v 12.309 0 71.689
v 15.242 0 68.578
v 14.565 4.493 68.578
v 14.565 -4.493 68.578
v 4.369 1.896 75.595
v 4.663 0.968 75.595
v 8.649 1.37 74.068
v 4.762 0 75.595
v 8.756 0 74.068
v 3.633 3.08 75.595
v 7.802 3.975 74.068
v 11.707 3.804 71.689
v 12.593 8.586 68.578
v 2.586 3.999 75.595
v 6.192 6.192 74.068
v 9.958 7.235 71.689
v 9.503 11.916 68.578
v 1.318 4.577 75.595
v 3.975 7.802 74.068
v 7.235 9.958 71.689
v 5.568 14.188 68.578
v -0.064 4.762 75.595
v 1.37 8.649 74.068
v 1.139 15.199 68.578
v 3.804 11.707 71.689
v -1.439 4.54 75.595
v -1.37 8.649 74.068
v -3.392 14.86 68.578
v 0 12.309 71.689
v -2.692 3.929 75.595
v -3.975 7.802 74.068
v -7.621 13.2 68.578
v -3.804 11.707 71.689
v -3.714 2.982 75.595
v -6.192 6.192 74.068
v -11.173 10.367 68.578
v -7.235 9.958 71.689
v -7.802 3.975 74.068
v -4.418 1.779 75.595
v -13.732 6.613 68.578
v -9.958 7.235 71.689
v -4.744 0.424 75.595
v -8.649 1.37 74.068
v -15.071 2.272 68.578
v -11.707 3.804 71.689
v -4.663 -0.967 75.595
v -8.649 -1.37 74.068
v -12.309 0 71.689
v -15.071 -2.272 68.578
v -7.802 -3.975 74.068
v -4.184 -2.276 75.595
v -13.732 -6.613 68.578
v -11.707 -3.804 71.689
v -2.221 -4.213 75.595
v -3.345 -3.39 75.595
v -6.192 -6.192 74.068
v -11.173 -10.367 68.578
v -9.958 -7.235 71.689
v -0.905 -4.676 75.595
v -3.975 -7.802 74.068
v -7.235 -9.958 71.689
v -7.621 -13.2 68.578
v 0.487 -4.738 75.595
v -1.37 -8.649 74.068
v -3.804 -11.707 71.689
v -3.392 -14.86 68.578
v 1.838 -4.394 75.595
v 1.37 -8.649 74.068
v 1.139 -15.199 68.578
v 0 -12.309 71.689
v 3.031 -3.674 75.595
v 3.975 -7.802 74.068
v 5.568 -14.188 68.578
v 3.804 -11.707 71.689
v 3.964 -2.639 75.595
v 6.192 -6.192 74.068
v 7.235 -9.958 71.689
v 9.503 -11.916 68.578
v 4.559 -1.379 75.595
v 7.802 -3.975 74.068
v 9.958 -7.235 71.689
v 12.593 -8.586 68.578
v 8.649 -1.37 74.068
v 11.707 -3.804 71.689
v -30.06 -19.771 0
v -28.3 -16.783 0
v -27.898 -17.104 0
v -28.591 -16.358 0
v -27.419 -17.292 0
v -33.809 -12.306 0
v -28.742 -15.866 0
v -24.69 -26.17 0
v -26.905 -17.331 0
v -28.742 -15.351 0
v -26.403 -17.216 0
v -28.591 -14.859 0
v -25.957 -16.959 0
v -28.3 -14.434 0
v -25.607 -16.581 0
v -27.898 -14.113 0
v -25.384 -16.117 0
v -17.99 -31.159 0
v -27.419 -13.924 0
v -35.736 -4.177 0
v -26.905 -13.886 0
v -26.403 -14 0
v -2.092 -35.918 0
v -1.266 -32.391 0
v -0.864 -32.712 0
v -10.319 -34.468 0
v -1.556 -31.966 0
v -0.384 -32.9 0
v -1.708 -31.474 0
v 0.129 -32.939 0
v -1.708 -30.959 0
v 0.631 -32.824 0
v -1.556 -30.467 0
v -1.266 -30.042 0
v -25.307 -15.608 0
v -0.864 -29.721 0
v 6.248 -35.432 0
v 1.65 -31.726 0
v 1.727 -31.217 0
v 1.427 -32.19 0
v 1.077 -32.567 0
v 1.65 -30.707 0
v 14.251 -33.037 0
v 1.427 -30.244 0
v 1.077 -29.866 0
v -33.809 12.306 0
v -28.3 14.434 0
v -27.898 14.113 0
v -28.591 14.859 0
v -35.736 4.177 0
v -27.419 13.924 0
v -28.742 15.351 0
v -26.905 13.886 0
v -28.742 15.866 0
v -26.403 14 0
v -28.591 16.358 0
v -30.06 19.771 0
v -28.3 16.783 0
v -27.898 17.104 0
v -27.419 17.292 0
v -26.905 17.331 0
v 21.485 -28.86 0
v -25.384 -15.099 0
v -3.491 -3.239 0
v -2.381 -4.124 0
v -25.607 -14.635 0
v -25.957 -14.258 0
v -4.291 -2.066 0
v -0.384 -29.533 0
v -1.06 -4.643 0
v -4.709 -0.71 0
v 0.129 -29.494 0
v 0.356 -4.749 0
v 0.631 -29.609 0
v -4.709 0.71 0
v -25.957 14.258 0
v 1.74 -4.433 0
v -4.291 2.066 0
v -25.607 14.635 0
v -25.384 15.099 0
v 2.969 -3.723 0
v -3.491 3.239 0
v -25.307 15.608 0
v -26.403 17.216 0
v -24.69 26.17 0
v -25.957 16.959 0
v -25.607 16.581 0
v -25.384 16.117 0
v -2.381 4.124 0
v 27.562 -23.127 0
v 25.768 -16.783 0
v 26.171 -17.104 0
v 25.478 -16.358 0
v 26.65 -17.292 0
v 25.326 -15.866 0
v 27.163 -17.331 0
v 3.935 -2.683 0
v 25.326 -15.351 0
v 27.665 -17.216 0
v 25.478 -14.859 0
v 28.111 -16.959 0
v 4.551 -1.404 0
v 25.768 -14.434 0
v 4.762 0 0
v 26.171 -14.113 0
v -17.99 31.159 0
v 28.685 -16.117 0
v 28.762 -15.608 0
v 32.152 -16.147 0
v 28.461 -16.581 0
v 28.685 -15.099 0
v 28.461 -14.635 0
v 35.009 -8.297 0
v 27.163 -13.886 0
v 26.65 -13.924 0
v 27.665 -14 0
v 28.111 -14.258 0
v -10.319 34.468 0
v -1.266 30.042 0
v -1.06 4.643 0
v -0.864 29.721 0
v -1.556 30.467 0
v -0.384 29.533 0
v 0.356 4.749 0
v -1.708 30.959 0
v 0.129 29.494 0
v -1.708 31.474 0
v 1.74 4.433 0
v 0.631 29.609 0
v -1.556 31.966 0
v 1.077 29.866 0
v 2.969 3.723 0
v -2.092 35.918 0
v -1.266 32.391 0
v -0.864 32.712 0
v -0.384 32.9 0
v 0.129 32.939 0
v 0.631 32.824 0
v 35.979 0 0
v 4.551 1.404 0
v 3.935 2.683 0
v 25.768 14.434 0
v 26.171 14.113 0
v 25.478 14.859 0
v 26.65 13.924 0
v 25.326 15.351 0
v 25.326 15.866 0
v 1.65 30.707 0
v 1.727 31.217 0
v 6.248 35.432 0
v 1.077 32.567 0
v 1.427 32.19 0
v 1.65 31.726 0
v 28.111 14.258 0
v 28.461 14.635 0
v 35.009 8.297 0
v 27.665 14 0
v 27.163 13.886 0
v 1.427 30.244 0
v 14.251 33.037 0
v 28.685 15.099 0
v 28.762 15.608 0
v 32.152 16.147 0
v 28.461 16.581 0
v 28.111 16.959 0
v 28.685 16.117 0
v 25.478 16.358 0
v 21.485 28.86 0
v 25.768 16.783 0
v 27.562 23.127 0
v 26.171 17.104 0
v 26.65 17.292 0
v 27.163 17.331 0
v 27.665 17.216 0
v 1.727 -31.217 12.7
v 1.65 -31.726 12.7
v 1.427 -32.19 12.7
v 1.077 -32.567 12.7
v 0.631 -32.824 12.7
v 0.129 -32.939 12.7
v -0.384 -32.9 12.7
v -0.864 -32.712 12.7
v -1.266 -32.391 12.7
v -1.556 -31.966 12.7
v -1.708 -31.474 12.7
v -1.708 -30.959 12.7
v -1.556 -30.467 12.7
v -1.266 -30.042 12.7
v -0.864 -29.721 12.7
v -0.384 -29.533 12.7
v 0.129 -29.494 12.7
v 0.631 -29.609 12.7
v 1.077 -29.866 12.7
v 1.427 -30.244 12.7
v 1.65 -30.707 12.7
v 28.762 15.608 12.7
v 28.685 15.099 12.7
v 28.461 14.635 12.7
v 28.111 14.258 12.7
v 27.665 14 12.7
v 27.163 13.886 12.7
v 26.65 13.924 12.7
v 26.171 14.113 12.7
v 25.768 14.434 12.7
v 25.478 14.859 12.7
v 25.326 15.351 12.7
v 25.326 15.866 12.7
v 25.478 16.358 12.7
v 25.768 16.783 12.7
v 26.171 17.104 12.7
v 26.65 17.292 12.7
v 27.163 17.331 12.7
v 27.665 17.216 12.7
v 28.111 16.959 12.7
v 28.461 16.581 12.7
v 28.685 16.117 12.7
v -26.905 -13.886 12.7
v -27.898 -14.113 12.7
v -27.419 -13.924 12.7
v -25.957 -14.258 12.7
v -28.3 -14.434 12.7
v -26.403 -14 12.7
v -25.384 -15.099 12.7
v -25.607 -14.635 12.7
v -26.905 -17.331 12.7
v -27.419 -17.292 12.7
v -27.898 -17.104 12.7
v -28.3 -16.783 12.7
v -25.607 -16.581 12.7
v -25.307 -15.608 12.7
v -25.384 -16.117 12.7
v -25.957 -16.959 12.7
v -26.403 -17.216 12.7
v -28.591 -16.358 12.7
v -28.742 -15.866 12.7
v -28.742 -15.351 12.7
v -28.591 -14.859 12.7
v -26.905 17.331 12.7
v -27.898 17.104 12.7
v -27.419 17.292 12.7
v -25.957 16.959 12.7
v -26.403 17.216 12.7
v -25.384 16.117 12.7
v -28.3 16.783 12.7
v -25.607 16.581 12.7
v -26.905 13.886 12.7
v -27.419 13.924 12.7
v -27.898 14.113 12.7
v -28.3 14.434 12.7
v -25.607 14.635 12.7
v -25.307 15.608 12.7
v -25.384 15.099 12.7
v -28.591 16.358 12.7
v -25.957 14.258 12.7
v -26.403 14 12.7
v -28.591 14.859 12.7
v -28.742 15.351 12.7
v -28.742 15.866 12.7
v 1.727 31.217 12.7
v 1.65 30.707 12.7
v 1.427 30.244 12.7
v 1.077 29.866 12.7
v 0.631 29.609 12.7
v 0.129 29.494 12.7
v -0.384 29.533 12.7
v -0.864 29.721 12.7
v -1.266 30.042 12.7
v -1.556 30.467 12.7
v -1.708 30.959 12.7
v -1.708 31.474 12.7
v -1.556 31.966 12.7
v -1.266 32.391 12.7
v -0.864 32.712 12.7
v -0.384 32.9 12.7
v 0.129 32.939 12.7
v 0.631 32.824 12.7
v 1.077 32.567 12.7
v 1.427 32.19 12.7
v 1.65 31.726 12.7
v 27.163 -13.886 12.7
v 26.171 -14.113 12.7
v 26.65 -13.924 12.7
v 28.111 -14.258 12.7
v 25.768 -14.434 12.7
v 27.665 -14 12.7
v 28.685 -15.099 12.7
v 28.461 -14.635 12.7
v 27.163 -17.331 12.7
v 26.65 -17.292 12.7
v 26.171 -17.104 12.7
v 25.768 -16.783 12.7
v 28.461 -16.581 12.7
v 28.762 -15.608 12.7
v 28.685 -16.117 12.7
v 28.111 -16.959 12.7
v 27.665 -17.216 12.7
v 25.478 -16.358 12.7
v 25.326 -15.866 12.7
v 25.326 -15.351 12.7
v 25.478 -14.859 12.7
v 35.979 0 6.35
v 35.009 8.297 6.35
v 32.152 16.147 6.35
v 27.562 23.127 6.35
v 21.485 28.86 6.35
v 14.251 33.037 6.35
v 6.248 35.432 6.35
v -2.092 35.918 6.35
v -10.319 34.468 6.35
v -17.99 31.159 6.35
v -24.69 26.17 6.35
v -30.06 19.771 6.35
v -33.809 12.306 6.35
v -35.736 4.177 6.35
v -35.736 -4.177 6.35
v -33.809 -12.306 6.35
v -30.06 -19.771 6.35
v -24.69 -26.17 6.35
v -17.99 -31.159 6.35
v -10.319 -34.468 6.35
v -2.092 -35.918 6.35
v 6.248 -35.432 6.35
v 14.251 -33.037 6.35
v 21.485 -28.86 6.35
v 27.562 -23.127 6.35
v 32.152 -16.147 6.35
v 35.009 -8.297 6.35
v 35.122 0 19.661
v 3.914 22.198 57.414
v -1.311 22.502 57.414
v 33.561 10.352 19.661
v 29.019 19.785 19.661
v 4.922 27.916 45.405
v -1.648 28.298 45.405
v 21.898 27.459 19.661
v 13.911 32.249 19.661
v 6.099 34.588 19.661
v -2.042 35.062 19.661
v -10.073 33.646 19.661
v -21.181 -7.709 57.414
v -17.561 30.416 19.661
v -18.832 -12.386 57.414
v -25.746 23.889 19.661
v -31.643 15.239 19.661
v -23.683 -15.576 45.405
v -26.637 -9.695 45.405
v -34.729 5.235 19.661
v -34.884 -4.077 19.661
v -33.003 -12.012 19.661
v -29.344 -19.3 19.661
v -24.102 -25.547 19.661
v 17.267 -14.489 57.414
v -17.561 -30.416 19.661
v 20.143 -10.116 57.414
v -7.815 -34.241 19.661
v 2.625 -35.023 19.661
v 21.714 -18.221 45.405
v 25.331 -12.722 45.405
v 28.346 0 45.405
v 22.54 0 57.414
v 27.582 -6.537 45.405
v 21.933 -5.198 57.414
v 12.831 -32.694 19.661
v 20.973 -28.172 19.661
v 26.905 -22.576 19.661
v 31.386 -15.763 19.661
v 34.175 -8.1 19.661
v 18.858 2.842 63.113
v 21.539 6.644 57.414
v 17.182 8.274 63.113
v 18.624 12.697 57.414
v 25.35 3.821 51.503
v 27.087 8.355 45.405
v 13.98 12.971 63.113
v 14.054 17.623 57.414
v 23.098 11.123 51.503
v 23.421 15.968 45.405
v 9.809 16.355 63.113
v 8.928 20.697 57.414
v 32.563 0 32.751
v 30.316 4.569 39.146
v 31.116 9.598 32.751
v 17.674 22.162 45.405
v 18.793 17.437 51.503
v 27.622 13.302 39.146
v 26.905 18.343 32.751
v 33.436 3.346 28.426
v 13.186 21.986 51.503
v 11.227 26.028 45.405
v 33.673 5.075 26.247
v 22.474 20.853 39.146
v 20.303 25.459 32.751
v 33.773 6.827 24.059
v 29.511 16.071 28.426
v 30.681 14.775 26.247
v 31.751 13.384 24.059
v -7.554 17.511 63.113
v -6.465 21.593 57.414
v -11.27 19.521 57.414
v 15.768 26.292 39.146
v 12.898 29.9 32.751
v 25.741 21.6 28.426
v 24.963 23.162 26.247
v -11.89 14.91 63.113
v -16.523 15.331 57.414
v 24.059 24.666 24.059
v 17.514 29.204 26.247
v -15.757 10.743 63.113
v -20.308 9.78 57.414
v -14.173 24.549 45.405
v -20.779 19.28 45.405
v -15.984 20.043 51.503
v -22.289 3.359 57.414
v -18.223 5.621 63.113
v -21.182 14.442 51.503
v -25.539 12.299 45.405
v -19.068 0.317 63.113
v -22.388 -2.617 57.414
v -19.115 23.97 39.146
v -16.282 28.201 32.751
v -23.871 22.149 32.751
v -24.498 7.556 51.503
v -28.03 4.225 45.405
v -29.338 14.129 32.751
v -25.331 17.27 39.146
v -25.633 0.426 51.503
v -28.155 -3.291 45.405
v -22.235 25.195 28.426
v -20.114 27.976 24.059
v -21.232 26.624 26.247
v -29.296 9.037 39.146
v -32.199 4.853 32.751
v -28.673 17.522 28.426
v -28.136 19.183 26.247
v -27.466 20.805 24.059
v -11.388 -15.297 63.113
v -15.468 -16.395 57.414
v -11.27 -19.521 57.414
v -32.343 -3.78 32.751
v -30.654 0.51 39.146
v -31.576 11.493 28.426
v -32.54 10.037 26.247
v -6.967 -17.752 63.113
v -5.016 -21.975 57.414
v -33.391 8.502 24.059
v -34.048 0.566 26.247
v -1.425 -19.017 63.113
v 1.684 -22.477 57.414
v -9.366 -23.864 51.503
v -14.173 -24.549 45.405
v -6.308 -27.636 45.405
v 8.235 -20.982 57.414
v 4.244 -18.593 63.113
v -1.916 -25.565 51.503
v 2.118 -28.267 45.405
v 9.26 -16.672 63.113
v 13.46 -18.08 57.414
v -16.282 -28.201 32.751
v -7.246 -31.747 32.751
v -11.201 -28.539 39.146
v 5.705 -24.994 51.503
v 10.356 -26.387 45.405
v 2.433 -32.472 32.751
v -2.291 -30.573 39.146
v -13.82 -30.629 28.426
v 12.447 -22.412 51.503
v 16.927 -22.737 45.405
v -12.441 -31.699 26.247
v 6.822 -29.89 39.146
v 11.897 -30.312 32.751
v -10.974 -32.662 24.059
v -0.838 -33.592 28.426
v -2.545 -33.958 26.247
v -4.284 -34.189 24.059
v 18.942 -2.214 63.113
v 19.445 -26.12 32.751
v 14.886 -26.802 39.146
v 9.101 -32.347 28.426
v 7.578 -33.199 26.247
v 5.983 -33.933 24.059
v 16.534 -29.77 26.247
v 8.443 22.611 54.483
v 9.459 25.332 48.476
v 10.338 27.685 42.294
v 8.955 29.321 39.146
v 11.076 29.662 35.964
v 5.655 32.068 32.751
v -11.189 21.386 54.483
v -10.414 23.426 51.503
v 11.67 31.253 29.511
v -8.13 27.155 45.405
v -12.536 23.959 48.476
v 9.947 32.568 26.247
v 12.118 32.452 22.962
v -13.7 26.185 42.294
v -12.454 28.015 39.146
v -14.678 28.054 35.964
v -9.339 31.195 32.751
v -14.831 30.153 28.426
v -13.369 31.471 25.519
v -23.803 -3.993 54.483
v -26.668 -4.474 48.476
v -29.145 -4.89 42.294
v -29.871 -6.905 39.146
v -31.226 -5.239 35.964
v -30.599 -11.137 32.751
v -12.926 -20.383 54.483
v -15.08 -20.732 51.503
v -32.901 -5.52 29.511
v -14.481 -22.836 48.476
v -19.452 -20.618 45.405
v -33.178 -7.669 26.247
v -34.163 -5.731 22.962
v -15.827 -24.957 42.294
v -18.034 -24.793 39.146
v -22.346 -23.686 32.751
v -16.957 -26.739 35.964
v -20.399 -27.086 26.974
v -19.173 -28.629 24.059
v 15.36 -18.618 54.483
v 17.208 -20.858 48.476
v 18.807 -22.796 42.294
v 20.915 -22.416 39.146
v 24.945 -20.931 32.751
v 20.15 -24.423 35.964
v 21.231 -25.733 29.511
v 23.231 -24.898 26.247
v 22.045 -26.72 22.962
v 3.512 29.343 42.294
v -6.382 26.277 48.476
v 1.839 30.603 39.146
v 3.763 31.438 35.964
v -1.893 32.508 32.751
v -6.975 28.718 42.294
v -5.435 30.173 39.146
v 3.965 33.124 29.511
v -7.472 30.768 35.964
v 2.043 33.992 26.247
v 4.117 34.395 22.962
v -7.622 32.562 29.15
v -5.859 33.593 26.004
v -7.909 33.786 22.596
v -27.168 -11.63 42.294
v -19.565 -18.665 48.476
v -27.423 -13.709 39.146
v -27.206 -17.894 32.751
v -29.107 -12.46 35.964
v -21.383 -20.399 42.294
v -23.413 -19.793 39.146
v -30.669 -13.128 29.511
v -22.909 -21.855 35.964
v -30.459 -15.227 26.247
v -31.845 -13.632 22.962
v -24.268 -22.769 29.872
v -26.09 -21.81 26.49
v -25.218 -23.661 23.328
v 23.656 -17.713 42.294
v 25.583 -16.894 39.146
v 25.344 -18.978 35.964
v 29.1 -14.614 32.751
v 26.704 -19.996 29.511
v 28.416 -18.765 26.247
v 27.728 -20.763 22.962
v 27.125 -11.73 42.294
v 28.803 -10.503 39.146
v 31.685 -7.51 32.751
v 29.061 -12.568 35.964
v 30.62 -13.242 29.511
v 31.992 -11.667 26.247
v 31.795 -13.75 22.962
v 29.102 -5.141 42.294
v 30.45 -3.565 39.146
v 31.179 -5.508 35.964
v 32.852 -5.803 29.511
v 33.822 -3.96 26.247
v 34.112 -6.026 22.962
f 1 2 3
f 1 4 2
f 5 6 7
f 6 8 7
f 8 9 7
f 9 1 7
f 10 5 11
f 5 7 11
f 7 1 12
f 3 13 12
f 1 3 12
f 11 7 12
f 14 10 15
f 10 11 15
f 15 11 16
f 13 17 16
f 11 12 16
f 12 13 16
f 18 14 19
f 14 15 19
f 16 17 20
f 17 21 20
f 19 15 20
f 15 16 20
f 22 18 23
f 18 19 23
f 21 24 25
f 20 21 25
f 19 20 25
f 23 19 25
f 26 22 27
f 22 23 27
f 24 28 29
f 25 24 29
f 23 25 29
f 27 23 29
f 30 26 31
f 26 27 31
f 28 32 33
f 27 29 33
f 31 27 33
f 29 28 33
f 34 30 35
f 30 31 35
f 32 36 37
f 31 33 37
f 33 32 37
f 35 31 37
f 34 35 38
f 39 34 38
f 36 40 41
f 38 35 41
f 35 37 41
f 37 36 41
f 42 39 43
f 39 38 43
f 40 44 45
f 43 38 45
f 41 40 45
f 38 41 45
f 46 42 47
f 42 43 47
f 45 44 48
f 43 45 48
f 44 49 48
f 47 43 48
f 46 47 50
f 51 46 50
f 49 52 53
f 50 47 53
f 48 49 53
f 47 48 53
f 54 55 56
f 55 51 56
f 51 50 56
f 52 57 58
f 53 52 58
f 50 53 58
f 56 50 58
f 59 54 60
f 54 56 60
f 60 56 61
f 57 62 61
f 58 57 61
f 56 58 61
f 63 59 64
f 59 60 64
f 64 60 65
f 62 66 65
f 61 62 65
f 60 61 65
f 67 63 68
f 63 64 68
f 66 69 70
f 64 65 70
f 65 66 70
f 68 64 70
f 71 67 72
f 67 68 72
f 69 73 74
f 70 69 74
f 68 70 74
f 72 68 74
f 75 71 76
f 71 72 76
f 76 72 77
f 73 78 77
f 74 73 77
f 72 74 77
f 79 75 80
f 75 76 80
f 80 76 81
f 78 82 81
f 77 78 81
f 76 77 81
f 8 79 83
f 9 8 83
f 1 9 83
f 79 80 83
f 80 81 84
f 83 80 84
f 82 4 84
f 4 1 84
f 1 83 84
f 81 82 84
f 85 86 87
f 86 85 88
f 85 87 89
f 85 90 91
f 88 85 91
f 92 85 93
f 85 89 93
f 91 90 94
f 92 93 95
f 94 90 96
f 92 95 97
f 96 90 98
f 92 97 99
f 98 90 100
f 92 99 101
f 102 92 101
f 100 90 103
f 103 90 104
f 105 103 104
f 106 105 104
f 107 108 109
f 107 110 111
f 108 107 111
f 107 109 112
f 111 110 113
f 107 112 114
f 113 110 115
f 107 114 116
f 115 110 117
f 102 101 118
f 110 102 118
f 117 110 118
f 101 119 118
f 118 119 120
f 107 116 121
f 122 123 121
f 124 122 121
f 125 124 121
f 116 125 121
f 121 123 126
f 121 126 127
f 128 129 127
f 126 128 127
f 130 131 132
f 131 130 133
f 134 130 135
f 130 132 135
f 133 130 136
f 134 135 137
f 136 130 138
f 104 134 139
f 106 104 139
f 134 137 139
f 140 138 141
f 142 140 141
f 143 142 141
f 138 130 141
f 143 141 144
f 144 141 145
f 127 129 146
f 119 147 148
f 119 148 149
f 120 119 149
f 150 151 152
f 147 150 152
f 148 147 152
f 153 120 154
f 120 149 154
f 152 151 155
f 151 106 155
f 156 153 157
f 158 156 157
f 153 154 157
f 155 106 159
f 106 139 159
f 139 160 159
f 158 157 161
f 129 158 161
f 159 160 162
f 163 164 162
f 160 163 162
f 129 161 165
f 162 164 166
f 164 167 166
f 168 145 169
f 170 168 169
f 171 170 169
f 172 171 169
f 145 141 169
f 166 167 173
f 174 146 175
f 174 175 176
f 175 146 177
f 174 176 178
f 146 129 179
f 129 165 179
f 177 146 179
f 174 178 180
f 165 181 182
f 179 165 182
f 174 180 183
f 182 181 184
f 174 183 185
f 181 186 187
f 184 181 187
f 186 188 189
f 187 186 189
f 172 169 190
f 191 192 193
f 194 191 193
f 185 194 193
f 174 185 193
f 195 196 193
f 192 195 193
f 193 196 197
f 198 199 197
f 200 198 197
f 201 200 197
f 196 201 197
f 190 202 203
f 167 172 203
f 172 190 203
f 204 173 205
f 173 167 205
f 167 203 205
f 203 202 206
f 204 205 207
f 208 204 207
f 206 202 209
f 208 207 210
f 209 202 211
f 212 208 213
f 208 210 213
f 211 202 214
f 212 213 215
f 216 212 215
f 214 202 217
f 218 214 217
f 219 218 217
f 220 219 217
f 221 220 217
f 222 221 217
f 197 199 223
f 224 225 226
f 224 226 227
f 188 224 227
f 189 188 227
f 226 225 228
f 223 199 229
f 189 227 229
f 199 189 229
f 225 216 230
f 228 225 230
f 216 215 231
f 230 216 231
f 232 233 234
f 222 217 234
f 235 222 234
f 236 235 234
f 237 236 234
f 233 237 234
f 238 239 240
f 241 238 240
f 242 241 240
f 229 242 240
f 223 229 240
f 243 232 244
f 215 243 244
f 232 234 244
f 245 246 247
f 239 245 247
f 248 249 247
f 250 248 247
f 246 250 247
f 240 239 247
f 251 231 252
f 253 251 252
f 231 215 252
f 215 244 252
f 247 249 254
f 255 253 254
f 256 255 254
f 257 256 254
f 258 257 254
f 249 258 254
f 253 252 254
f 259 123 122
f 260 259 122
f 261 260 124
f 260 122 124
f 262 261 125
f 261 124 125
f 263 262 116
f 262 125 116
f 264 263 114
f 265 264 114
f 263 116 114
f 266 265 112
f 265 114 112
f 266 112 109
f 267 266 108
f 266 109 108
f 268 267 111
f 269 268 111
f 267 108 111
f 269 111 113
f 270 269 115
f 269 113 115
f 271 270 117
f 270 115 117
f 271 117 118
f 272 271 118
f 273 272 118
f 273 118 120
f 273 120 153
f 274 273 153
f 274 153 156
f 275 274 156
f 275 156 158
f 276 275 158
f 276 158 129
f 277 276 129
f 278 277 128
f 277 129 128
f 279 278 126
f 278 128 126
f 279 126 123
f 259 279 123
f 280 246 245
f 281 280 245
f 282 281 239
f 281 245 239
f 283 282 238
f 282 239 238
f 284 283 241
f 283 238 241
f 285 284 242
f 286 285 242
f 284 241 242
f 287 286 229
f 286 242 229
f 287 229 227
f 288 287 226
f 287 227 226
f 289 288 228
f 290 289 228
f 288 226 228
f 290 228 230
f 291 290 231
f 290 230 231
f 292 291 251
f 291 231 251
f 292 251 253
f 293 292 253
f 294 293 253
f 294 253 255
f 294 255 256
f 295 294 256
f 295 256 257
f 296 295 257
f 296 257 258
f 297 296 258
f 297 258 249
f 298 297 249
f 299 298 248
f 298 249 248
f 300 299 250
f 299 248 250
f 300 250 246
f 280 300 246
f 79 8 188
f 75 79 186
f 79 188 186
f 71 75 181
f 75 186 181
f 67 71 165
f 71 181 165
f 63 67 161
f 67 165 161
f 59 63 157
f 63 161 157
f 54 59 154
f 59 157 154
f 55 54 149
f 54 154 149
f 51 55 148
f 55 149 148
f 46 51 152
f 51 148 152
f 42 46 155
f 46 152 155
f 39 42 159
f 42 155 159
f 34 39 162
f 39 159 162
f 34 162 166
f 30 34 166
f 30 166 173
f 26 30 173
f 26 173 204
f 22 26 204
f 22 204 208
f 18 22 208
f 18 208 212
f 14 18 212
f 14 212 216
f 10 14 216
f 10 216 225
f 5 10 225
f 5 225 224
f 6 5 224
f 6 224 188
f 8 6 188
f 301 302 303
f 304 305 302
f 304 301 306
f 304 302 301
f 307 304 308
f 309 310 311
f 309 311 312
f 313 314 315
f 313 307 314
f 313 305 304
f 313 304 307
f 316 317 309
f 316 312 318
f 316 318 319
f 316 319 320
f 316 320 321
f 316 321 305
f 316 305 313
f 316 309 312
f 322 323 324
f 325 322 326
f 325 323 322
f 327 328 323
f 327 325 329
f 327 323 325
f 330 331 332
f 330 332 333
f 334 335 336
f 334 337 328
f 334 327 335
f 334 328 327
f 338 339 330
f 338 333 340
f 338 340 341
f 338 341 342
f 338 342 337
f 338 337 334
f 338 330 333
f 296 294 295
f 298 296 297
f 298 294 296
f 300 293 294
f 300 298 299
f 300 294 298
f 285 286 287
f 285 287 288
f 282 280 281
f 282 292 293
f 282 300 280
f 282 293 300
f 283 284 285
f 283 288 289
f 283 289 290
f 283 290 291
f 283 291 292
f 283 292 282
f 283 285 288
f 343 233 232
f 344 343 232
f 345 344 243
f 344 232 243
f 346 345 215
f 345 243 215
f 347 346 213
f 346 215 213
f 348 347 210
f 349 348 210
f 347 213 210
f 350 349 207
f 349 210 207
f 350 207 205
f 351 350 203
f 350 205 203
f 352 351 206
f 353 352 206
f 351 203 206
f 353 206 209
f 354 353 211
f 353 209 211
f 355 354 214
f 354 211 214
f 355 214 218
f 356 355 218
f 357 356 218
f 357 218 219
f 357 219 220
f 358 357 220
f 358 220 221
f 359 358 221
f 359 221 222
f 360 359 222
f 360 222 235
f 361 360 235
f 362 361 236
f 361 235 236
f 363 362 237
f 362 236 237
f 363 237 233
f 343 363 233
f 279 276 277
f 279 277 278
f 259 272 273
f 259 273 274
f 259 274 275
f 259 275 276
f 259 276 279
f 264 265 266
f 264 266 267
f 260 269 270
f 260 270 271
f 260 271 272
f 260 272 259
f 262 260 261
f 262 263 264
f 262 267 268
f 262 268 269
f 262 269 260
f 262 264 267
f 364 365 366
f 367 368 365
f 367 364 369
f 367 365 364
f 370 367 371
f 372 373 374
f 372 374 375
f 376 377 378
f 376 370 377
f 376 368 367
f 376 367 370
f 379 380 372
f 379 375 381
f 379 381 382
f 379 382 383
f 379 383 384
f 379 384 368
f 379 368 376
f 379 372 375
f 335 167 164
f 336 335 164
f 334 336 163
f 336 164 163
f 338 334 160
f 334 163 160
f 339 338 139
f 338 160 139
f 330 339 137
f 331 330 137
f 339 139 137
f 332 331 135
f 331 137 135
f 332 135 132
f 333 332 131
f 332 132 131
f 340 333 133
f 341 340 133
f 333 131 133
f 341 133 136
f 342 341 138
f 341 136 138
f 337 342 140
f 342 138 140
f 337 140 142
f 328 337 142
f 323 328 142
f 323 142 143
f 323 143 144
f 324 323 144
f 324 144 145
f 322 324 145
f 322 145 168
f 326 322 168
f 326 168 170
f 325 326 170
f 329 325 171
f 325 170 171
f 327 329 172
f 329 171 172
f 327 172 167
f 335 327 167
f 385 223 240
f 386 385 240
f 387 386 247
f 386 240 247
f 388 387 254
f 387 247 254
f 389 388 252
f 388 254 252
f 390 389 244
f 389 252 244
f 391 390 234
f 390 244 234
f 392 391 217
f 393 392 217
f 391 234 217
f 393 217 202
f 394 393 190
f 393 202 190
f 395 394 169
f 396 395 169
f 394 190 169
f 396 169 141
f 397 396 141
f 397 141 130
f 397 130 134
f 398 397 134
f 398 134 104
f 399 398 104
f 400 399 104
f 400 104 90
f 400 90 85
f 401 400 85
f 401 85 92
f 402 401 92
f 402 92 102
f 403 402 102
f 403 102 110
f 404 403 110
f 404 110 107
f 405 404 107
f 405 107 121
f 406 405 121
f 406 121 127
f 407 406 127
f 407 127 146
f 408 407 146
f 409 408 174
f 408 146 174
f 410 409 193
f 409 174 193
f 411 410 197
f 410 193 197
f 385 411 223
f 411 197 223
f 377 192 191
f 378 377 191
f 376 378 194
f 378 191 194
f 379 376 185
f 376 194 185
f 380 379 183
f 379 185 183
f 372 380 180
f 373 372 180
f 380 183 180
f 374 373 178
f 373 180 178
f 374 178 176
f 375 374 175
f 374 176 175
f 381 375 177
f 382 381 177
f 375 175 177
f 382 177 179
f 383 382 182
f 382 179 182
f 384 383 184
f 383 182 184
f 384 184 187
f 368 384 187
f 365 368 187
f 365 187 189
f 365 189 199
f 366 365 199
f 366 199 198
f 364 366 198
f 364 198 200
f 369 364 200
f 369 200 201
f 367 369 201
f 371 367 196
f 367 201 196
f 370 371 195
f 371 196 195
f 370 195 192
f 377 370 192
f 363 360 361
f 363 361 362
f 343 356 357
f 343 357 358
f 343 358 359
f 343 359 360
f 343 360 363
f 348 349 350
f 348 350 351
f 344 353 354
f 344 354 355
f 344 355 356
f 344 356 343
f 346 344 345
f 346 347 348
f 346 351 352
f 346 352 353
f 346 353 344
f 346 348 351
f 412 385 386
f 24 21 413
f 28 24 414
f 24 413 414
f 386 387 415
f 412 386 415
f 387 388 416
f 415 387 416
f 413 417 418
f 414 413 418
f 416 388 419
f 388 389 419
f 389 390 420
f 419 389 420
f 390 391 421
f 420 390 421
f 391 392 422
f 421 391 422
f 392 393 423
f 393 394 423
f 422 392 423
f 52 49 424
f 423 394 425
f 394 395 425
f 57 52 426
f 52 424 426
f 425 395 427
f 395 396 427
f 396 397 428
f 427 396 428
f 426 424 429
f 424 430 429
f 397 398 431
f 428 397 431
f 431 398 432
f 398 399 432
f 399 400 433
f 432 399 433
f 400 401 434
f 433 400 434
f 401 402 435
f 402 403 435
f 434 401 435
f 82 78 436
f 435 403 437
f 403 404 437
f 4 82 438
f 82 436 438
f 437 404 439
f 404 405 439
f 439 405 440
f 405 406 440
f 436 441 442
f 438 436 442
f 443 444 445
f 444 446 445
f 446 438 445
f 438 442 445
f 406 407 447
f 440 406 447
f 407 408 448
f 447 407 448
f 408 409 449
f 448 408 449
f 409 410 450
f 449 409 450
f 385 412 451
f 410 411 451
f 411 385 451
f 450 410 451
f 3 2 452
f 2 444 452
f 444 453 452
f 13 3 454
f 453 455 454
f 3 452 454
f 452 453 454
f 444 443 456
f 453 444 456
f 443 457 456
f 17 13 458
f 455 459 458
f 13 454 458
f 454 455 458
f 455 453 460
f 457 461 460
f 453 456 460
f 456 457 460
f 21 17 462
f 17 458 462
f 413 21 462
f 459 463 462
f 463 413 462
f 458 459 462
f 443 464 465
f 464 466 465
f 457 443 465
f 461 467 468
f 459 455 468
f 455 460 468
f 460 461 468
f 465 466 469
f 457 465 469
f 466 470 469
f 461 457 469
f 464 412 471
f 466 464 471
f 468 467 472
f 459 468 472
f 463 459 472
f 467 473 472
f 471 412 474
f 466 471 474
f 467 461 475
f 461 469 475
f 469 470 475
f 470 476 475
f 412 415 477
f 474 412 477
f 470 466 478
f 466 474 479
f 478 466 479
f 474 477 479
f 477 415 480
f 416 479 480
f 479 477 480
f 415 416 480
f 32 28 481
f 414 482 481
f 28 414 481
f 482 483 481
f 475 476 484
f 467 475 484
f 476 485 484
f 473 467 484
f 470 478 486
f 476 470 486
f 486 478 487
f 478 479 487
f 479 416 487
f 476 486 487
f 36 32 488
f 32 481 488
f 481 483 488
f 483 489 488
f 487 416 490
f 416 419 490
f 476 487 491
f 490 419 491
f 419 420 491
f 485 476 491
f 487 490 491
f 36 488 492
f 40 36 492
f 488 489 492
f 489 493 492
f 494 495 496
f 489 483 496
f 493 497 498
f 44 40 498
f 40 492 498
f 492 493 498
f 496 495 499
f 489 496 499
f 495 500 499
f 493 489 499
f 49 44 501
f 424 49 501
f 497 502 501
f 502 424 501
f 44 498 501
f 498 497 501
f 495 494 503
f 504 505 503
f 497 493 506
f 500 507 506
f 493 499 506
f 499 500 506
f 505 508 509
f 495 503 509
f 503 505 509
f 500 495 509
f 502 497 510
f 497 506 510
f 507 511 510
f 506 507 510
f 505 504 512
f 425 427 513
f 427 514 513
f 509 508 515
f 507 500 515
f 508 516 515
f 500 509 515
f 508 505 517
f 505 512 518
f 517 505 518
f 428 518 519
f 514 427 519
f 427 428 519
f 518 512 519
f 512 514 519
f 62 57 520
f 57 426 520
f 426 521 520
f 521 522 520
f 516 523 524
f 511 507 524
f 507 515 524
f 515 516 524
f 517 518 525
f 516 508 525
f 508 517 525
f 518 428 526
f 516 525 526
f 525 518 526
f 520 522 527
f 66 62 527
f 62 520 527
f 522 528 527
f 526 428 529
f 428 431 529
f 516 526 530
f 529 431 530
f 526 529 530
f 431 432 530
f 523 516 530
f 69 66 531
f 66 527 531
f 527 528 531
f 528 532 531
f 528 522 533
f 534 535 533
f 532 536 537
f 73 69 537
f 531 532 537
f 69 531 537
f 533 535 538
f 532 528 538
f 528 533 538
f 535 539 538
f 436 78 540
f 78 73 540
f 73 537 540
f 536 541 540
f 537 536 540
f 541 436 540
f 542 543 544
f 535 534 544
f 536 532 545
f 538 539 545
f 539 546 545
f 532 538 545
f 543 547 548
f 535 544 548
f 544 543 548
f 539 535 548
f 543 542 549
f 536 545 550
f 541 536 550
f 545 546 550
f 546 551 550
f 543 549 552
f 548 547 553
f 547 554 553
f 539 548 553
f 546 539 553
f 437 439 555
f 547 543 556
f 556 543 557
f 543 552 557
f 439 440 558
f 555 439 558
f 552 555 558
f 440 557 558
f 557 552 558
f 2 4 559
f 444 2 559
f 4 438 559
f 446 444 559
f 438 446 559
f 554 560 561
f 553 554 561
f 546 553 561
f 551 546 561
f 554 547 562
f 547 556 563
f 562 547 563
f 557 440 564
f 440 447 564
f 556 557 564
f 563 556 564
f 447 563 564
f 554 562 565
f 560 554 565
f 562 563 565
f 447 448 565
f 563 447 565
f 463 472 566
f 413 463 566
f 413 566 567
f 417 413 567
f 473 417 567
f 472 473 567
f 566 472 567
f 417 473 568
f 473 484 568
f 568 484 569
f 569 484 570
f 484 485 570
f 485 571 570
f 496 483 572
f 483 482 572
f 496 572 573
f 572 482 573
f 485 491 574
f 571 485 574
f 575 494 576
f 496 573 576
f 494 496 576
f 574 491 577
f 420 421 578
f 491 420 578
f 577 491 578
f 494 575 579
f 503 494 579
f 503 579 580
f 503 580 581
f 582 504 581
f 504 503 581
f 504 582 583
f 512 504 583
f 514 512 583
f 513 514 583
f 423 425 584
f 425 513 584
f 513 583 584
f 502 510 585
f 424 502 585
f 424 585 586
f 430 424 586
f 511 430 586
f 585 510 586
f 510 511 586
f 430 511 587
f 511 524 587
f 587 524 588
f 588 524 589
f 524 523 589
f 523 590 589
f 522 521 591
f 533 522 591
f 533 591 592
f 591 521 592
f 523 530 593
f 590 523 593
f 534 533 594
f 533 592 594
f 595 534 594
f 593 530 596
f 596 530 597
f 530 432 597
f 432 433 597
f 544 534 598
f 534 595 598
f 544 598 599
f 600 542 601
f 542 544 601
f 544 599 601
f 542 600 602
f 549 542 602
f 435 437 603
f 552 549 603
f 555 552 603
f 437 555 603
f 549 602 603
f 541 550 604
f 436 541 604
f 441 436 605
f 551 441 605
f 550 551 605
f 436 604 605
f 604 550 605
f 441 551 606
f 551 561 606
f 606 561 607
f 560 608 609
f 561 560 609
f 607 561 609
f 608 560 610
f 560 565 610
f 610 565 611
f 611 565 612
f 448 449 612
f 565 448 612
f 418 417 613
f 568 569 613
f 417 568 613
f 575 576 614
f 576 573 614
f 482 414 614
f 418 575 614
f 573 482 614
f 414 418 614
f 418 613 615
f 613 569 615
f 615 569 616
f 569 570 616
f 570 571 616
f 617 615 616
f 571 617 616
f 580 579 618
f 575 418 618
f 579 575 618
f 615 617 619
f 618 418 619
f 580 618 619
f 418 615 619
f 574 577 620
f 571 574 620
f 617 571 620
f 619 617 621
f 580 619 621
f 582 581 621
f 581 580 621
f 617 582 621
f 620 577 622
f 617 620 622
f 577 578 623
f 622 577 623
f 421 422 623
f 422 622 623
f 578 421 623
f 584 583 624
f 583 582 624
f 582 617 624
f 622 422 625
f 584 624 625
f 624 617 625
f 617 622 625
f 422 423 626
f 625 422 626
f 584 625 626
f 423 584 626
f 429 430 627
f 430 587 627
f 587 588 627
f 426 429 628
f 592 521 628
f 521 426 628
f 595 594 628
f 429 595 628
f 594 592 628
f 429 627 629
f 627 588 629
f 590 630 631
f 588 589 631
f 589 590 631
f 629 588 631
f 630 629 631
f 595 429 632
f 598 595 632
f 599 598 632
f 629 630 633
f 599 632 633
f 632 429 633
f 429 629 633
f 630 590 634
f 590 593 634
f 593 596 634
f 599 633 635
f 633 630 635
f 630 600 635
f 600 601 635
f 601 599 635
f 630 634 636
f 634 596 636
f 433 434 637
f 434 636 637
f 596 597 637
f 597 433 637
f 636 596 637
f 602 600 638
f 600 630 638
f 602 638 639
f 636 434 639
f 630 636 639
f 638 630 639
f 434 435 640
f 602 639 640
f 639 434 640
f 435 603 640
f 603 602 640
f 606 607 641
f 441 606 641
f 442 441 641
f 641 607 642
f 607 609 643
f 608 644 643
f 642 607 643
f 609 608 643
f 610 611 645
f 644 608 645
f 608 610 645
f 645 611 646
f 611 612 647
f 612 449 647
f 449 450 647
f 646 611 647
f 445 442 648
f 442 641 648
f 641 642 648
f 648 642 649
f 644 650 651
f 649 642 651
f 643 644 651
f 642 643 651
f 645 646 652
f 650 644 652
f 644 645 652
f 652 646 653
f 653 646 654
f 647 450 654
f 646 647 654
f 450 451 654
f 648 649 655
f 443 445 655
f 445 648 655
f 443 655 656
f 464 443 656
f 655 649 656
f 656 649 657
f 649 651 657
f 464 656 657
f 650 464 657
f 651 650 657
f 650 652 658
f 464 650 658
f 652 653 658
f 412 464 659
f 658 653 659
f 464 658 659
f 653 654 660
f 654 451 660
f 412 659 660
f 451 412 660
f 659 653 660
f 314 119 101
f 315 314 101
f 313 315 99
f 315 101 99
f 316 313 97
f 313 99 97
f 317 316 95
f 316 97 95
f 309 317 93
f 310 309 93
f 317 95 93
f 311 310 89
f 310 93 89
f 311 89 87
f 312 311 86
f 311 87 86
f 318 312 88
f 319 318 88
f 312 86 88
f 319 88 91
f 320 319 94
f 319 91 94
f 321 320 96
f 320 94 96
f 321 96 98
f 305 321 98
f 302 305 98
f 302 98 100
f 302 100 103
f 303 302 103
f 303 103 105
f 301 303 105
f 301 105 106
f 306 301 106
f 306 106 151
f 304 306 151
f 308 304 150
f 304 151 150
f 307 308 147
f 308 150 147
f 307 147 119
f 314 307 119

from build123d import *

# Parameters (mm, degrees)
F0_R     = 35.9791
F1_DEPTH = 76.2
F4_R     = 4.7625
F5_DEPTH = 156
F6_R     = 1.7272
F7_DEPTH = 12.7


# Not quite as in the source:
# - an extrude ends at something that could not be found from the text; its depth is read off the source's solid


with BuildPart() as f1:
    # F0 (on Top) → F1 (new body)
    with BuildSketch(Plane.XY):
        Circle(F0_R)
    extrude(amount=F1_DEPTH)

    # F2 (on Front) → F3 (revolve, cut)
    with BuildSketch(Plane.XZ):
        with BuildLine():
            ThreePointArc((0, 76.2), (8.5206969151, 74.1881989682), (15.2417143714, 68.5777138143))
            ThreePointArc((15.2417143714, 68.5777138143), (30.6582935654, 39.1460650432), (35.9791, 6.35))
            Line((35.9791, 6.35), (71.9582, 6.35))
            Line((71.9582, 6.35), (71.9582, 112.1791))
            Line((71.9582, 112.1791), (0, 112.1791))
            Line((0, 112.1791), (0, 76.2))
        make_face()
    revolve(axis=Axis((0, 0, 76.2), (0, 0, 1)), mode=Mode.SUBTRACT)

    # F4 (on face) → F5 (cut, through all)
    with BuildSketch(Plane(origin=(0, 0, 0), x_dir=(1, 0, 0), z_dir=(0, 0, -1))):
        Circle(F4_R)
    extrude(amount=-F5_DEPTH, mode=Mode.SUBTRACT)

    # F6 (on face) → F7 (cut)
    with BuildSketch(Plane(origin=(0, 0, 0), x_dir=(1, 0, 0), z_dir=(0, 0, -1))):
        with Locations((-27.0343686198, -15.6083)):
            Circle(F6_R)
        with Locations((-27.0343686198, 15.6083)):
            Circle(F6_R)
        with Locations((0, 31.2166)):
            Circle(F6_R)
        with Locations((27.0343686198, 15.6083)):
            Circle(F6_R)
        with Locations((27.0343686198, -15.6083)):
            Circle(F6_R)
        with Locations((0, -31.2166)):
            Circle(F6_R)
    extrude(amount=-F7_DEPTH, mode=Mode.SUBTRACT)


solid = f1.part
